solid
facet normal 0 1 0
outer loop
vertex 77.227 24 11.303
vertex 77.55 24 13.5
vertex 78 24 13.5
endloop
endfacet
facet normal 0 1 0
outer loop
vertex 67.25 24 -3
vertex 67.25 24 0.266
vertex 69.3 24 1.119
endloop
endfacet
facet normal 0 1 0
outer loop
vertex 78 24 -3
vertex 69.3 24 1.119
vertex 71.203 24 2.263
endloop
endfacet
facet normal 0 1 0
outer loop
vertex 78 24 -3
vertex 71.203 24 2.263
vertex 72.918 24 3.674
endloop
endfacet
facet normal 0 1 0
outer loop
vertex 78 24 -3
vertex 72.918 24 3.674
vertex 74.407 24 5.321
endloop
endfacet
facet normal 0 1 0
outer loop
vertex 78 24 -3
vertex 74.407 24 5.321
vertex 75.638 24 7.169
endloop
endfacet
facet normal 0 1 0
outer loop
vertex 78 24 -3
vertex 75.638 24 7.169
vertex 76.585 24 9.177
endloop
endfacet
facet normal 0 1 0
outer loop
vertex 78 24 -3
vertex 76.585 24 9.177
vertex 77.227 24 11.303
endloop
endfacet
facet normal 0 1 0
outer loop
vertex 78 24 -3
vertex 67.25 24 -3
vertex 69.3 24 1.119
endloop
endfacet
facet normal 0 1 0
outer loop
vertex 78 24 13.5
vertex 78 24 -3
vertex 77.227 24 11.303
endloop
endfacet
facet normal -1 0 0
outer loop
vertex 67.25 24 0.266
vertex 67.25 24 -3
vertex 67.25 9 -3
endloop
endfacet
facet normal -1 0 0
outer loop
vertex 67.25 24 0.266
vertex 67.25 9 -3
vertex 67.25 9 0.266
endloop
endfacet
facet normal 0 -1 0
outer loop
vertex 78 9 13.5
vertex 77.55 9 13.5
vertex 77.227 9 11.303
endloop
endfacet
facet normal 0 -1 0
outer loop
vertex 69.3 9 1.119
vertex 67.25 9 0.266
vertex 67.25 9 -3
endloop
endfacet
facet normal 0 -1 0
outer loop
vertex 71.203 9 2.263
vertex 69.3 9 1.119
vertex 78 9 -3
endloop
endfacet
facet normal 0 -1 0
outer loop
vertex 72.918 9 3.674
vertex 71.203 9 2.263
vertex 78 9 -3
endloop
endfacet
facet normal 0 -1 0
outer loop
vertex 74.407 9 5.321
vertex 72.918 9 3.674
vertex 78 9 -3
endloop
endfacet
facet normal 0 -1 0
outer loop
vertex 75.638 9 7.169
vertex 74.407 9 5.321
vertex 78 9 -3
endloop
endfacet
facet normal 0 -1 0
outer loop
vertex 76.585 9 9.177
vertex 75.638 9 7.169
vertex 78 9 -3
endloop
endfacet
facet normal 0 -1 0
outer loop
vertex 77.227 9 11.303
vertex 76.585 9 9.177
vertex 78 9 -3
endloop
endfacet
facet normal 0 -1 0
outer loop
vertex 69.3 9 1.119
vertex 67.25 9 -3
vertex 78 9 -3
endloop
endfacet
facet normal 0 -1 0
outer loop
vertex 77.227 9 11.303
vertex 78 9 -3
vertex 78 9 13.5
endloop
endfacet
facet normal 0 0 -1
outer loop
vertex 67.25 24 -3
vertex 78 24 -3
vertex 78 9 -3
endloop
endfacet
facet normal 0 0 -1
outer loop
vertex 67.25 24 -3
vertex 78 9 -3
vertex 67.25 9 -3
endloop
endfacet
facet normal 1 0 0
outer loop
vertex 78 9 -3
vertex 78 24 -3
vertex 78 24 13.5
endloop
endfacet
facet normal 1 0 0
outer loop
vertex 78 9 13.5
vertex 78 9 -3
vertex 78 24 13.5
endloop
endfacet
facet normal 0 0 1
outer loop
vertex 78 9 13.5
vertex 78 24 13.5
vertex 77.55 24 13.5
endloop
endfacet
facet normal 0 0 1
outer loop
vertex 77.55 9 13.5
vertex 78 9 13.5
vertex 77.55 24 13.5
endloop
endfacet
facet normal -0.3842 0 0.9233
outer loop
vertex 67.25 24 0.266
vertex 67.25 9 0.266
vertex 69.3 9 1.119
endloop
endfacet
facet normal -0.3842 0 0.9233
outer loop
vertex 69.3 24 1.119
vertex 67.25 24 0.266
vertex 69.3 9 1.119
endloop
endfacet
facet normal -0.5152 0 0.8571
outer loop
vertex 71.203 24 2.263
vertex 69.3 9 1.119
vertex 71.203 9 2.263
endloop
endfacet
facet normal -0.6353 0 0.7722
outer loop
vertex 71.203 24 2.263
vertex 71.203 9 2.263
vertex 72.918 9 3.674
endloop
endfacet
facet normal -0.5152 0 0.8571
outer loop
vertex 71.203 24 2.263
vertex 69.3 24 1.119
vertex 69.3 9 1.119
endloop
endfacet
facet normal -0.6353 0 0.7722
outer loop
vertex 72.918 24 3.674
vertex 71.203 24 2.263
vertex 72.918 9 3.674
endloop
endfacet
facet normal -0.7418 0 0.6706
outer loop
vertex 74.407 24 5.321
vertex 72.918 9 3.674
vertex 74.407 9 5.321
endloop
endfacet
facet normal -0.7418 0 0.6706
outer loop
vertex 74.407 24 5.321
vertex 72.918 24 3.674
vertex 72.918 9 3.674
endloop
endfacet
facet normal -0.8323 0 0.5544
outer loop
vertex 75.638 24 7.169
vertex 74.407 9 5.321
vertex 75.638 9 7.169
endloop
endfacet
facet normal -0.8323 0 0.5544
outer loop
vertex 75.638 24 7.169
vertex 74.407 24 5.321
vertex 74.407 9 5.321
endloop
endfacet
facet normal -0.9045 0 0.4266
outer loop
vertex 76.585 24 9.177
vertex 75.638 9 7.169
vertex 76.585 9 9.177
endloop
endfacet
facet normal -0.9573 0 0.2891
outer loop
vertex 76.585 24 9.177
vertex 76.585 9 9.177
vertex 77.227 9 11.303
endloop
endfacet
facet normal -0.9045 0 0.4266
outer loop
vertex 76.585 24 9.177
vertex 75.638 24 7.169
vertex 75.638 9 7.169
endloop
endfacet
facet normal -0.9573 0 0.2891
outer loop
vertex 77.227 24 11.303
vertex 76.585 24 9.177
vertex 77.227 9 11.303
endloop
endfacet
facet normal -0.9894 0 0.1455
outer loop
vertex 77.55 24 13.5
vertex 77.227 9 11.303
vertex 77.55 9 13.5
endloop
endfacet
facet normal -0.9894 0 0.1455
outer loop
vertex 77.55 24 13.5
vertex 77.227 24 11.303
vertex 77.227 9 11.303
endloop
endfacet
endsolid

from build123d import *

# Parameters (mm, degrees)
PAD001_DEPTH = 15


with BuildPart() as batteryhold001:
    # Sketch002 → Pad001 (new body)
    with BuildSketch(Plane.XZ):
        with BuildLine():
            Line((0, 77.5), (10.75, 77.5))
            Line((10.75, 77.5), (10.75, 74.23403))
            ThreePointArc((10.75, 74.23403), (3.593187, 69.178911), (0.45, 61))
            Line((0, 61), (0.45, 61))
            Line((0, 77.5), (0, 61))
        make_face()
    extrude(amount=PAD001_DEPTH)


with BuildPart() as batteryhold001_1:
    # Body001 placement: moved
    add(batteryhold001.part.moved(Location((0, 24, 0))))


with BuildPart() as part_mirroring003:
    # Part__Mirroring003: instance of batteryHold001
    add(batteryhold001_1.part.mirror(Plane(origin=(0, 0, 0), x_dir=(0, 1, 0), z_dir=(0, 0, 1))))


with BuildPart() as part_mirroring003_1:
    # Part__Mirroring003 placement: moved
    add(part_mirroring003.part.moved(Location((0, 0, 74.5))))


with BuildPart() as part_mirroring004:
    # Part__Mirroring004: instance of Part__Mirroring003
    add(part_mirroring003_1.part.mirror(Plane(origin=(0, 0, 0), x_dir=(0, -1, 0), z_dir=(1, 0, 0))))


with BuildPart() as part_mirroring004_1:
    # Part__Mirroring004 placement: moved
    add(part_mirroring004.part.moved(Location((78, 0, 0))))


solid = part_mirroring004_1.part
